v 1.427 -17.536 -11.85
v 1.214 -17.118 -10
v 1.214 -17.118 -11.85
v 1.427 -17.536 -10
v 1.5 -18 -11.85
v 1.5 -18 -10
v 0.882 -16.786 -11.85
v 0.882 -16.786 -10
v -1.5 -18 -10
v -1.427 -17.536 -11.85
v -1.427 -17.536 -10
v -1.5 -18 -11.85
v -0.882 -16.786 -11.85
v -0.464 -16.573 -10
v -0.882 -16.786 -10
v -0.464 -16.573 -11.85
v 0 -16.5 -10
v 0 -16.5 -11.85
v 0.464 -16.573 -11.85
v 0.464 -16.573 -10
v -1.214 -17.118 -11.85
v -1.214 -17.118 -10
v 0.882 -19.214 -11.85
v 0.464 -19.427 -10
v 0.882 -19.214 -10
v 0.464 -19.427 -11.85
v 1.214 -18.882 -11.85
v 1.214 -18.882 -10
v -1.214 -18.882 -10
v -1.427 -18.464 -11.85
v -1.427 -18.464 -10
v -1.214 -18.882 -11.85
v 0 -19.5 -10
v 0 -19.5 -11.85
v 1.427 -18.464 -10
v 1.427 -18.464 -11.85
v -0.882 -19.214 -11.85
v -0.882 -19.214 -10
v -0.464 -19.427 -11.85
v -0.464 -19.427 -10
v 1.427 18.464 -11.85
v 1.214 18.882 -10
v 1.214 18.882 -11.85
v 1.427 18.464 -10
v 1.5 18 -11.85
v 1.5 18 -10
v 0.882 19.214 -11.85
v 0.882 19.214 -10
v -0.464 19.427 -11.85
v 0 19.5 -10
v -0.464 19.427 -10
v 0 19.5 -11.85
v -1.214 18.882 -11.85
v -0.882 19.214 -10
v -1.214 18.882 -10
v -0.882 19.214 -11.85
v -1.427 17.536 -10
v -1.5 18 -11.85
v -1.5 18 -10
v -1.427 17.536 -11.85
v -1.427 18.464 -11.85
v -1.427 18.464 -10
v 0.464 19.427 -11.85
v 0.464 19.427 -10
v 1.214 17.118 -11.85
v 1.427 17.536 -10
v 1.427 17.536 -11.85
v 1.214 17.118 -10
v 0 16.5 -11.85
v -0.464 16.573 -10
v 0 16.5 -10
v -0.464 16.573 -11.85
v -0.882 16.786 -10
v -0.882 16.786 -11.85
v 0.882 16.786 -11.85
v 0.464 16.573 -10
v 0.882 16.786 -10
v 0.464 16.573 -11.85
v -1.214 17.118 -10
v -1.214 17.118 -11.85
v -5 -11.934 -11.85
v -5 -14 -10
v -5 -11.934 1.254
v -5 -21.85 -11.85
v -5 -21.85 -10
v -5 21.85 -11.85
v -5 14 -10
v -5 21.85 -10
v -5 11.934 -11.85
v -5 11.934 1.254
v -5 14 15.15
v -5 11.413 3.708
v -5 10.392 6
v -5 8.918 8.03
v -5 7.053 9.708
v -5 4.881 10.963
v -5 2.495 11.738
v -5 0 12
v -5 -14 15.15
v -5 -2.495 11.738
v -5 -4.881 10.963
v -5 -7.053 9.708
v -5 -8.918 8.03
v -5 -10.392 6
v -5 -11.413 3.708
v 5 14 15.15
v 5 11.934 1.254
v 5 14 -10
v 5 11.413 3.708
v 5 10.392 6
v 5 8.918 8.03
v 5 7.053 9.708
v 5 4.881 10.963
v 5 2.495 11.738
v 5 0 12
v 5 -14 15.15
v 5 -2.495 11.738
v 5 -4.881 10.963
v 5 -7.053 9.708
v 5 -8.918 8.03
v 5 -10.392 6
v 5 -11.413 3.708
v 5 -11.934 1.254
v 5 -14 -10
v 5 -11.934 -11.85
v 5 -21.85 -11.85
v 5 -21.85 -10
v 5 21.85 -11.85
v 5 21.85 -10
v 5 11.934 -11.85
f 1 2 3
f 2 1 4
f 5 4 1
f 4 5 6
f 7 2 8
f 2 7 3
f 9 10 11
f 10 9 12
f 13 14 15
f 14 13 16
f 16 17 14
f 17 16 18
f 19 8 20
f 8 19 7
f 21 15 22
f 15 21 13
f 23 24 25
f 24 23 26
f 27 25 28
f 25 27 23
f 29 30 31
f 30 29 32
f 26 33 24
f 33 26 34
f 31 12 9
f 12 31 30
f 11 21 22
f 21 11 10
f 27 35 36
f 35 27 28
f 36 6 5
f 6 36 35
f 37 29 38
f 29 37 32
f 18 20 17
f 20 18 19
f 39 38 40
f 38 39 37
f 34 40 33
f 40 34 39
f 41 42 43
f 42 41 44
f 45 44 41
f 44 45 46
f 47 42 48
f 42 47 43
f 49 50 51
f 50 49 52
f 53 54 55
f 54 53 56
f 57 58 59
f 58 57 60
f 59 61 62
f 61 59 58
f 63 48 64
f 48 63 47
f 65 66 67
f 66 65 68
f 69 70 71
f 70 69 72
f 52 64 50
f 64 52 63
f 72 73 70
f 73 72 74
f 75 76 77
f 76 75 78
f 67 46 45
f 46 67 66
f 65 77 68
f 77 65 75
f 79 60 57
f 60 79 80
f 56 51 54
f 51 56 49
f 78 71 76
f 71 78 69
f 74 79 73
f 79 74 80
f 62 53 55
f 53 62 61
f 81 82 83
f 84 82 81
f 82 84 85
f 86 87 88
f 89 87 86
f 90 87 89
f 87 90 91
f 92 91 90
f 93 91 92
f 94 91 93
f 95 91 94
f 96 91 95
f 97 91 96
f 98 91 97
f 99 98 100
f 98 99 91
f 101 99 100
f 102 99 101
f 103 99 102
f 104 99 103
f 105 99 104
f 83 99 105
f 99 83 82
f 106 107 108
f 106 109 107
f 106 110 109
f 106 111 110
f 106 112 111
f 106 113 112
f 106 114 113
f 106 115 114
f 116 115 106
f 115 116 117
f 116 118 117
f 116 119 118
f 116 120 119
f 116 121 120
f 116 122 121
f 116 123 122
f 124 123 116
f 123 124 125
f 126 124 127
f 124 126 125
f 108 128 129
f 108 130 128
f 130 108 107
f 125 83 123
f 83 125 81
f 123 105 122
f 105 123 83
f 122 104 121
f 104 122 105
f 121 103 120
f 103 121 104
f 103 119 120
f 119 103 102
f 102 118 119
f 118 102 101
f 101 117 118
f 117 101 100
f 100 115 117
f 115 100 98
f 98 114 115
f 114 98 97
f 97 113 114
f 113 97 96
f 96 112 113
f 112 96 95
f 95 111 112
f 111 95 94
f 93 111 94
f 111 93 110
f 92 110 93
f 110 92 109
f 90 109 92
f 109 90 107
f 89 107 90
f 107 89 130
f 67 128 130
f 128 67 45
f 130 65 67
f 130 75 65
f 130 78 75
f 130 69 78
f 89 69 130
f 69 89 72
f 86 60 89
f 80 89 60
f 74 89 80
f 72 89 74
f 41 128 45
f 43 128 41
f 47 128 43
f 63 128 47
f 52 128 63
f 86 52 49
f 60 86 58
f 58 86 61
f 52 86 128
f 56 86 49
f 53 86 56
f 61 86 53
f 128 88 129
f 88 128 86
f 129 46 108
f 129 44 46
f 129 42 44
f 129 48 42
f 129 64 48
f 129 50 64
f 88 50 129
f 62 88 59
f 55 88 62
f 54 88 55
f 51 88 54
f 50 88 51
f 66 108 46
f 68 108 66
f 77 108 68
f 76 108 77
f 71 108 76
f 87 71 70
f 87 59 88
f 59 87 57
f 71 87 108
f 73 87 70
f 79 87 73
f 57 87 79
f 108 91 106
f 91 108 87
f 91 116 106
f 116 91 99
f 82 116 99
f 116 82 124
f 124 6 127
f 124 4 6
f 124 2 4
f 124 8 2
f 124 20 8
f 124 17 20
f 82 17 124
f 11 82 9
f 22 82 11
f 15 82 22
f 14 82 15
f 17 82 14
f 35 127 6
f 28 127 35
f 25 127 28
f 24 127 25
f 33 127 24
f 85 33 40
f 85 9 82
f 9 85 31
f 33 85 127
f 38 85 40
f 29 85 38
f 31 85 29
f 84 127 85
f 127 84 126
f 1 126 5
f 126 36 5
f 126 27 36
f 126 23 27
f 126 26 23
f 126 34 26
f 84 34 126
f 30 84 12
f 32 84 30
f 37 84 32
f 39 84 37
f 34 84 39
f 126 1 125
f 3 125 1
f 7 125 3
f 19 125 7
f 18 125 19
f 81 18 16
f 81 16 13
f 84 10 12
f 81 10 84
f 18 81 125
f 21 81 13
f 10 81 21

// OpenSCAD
//rotate([0,90,0]) cylinder(d=23.7, h=30, center=true);
difference() {
/* holder: */
translate([-5,0,0])
rotate([0,90,0])
linear_extrude(10)
difference() {
    // -z,y
    union() {
        translate([-1.65,0]) square([27,43.7], center=true);
    }
    for (i = [-1,1]) {
        translate([-10,i*18]) square([40,8], center=true);
    }
    for (i = [0:20]) {
        translate([i,0]) circle(d=24);
    }
}
/* screw holes: */
for (i = [-1,1]) {
    translate([0,i*18,-15]) cylinder(d=3, h=10, $fn=20);
}
}
